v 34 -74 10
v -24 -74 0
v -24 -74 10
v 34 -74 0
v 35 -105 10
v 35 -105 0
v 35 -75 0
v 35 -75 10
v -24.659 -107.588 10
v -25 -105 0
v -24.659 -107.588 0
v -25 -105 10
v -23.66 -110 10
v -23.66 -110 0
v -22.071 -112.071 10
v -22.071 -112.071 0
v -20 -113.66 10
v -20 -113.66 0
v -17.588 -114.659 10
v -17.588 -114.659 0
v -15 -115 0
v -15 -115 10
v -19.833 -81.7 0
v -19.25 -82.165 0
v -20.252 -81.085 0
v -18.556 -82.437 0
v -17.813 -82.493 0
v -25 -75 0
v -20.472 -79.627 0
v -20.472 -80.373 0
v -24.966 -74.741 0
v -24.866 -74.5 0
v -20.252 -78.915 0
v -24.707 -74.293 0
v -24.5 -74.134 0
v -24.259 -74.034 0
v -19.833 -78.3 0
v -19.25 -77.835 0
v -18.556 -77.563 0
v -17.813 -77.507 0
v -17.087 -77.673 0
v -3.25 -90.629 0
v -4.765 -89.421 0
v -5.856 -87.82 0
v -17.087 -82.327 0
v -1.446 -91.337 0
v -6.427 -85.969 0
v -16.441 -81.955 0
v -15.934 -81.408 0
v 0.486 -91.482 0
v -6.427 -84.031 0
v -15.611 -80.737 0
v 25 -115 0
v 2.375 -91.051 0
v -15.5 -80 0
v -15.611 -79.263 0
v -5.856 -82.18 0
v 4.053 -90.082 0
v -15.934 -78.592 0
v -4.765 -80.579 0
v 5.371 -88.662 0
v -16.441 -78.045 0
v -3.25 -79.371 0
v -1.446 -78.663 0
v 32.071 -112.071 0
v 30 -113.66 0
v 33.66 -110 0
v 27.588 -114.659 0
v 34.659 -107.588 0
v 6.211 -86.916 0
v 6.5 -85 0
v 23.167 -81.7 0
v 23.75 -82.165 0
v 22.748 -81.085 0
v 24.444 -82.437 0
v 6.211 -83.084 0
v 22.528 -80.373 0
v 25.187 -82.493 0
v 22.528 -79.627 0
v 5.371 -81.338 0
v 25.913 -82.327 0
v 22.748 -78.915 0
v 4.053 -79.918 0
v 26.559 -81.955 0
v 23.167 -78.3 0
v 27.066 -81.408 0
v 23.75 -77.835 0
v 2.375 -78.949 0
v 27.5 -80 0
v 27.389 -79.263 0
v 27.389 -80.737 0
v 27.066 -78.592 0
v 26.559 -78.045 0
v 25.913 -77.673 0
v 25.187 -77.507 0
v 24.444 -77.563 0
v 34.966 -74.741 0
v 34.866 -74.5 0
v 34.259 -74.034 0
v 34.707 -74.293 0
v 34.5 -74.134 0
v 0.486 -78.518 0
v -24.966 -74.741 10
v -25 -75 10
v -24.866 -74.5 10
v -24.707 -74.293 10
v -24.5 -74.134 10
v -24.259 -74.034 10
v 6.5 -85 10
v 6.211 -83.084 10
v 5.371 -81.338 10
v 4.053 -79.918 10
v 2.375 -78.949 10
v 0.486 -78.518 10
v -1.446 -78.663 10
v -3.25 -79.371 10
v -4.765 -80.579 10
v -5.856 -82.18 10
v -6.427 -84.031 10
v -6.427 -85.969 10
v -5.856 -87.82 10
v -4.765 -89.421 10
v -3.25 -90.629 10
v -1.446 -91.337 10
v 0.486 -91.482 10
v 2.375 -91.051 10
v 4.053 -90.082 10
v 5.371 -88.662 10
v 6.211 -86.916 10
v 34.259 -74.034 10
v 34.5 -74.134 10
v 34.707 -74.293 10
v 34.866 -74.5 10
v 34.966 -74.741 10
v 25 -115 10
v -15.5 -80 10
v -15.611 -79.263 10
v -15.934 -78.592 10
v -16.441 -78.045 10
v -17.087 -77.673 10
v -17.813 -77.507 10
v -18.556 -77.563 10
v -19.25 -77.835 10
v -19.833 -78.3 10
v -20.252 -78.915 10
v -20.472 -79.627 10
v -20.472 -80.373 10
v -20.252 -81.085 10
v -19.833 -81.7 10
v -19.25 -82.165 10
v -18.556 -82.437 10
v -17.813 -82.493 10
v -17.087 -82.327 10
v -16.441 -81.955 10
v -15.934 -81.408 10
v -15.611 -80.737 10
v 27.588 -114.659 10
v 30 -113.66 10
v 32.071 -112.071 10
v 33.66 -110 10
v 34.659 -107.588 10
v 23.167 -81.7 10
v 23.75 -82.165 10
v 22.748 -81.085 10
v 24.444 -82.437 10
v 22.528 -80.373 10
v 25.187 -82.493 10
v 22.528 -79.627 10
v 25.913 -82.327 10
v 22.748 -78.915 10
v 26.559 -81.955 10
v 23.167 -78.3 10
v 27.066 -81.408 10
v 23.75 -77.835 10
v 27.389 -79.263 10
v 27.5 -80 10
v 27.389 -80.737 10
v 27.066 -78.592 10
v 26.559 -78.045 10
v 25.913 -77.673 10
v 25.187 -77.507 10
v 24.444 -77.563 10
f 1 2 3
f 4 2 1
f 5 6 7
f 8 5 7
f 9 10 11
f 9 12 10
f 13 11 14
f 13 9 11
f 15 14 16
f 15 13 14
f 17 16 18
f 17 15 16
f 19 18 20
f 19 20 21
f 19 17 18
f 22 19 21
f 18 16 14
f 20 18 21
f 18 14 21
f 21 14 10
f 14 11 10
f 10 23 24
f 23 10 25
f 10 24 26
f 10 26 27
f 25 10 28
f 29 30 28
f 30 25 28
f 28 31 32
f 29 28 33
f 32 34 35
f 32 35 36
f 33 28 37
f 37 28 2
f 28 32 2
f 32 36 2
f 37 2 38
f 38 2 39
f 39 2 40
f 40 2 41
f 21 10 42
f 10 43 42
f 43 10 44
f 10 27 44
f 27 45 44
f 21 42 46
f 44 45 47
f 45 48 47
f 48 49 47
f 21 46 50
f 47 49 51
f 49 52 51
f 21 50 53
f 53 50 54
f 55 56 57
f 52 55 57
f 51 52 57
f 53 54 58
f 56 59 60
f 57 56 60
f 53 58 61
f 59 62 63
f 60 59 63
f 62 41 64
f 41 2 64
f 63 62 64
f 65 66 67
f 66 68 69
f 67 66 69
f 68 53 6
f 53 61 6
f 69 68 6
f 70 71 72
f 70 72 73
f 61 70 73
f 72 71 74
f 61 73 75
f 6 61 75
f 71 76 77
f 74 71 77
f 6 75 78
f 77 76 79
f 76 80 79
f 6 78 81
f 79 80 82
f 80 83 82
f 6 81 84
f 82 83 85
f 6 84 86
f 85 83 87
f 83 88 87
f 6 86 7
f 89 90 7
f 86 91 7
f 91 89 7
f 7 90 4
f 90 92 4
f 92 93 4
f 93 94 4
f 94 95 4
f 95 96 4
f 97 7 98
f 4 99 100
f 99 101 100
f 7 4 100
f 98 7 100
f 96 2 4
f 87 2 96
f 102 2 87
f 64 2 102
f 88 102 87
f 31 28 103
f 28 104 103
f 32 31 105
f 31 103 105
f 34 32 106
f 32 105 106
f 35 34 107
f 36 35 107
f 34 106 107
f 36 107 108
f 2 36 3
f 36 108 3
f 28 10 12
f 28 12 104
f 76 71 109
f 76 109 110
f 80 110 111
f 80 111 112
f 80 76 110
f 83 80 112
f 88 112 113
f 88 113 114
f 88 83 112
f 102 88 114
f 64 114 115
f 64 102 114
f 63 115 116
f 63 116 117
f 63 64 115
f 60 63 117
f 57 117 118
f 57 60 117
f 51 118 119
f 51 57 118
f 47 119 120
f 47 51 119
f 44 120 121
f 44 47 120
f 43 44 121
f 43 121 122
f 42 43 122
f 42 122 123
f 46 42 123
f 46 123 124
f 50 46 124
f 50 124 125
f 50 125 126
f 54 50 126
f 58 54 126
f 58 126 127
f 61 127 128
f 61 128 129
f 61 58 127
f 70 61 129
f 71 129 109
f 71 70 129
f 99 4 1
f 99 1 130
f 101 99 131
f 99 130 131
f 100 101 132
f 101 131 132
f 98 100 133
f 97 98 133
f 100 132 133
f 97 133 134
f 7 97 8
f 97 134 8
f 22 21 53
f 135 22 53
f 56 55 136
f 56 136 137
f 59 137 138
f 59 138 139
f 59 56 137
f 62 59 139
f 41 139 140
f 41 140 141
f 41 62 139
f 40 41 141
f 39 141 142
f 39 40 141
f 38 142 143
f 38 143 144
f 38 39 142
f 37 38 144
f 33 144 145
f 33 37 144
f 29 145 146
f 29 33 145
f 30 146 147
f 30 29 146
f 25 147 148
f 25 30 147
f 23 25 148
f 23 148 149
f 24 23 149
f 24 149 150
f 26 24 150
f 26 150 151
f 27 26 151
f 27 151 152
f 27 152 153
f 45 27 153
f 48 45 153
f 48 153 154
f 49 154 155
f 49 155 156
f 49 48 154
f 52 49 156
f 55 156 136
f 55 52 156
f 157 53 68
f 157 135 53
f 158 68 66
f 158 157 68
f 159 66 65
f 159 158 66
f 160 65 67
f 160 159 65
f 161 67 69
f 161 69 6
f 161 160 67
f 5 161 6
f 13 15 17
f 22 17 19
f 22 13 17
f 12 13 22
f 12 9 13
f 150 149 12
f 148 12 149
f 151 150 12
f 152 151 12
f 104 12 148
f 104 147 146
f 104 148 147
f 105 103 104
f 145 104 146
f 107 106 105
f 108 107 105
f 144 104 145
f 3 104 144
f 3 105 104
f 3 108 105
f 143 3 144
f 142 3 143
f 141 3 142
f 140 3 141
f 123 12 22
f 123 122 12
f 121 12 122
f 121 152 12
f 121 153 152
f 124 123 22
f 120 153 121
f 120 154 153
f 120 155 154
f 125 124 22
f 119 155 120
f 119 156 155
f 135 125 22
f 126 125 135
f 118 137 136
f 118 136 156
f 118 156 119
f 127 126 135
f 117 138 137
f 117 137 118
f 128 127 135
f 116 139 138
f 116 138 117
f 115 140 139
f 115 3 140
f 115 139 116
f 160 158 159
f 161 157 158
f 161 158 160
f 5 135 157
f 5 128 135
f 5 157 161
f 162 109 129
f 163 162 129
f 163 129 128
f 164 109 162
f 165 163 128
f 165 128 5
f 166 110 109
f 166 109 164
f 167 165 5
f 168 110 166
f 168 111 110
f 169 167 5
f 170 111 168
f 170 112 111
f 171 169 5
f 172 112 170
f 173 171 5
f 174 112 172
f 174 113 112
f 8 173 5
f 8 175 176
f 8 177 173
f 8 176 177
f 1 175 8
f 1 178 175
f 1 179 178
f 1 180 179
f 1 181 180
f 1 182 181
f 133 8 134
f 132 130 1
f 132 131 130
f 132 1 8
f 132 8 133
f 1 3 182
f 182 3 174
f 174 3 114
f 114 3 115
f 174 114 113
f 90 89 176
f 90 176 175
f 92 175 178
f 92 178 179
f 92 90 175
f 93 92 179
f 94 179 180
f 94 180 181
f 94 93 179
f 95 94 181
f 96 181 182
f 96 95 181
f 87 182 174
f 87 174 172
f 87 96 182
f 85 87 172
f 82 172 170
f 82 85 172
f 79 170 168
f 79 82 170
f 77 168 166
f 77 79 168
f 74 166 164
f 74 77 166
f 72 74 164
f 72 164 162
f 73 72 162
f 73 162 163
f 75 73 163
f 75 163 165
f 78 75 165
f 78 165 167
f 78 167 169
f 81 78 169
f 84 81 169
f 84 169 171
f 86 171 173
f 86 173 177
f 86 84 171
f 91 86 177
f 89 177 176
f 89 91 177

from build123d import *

# Parameters (mm, degrees)
SKETCH_W    = 60
SKETCH_H    = 41
SKETCH_R    = 2.5
SKETCH_R_2  = 6.5
PAD_DEPTH   = 10
FILLET_R    = 10
FILLET001_R = 1


with BuildPart() as part:
    # Sketch → Pad (new body)
    with BuildSketch(Plane.XY):
        with Locations((5, -94.5)):
            Rectangle(SKETCH_W, SKETCH_H)
        with Locations((25, -80)):
            Circle(SKETCH_R, mode=Mode.SUBTRACT)
        with Locations((-18, -80)):
            Circle(SKETCH_R, mode=Mode.SUBTRACT)
        with Locations((0, -85)):
            Circle(SKETCH_R_2, mode=Mode.SUBTRACT)
    extrude(amount=PAD_DEPTH)

    # Fillet
    fillet_edges = [part.edges().sort_by_distance(p)[0] for p in [
        (-25, -115, 5),
        (35, -115, 5),
    ]]
    fillet(fillet_edges, radius=FILLET_R)

    # Fillet001
    fillet001_edges = [part.edges().sort_by_distance(p)[0] for p in [
        (-25, -74, 5),
        (35, -74, 5),
    ]]
    fillet(fillet001_edges, radius=FILLET001_R)


solid = part.part
